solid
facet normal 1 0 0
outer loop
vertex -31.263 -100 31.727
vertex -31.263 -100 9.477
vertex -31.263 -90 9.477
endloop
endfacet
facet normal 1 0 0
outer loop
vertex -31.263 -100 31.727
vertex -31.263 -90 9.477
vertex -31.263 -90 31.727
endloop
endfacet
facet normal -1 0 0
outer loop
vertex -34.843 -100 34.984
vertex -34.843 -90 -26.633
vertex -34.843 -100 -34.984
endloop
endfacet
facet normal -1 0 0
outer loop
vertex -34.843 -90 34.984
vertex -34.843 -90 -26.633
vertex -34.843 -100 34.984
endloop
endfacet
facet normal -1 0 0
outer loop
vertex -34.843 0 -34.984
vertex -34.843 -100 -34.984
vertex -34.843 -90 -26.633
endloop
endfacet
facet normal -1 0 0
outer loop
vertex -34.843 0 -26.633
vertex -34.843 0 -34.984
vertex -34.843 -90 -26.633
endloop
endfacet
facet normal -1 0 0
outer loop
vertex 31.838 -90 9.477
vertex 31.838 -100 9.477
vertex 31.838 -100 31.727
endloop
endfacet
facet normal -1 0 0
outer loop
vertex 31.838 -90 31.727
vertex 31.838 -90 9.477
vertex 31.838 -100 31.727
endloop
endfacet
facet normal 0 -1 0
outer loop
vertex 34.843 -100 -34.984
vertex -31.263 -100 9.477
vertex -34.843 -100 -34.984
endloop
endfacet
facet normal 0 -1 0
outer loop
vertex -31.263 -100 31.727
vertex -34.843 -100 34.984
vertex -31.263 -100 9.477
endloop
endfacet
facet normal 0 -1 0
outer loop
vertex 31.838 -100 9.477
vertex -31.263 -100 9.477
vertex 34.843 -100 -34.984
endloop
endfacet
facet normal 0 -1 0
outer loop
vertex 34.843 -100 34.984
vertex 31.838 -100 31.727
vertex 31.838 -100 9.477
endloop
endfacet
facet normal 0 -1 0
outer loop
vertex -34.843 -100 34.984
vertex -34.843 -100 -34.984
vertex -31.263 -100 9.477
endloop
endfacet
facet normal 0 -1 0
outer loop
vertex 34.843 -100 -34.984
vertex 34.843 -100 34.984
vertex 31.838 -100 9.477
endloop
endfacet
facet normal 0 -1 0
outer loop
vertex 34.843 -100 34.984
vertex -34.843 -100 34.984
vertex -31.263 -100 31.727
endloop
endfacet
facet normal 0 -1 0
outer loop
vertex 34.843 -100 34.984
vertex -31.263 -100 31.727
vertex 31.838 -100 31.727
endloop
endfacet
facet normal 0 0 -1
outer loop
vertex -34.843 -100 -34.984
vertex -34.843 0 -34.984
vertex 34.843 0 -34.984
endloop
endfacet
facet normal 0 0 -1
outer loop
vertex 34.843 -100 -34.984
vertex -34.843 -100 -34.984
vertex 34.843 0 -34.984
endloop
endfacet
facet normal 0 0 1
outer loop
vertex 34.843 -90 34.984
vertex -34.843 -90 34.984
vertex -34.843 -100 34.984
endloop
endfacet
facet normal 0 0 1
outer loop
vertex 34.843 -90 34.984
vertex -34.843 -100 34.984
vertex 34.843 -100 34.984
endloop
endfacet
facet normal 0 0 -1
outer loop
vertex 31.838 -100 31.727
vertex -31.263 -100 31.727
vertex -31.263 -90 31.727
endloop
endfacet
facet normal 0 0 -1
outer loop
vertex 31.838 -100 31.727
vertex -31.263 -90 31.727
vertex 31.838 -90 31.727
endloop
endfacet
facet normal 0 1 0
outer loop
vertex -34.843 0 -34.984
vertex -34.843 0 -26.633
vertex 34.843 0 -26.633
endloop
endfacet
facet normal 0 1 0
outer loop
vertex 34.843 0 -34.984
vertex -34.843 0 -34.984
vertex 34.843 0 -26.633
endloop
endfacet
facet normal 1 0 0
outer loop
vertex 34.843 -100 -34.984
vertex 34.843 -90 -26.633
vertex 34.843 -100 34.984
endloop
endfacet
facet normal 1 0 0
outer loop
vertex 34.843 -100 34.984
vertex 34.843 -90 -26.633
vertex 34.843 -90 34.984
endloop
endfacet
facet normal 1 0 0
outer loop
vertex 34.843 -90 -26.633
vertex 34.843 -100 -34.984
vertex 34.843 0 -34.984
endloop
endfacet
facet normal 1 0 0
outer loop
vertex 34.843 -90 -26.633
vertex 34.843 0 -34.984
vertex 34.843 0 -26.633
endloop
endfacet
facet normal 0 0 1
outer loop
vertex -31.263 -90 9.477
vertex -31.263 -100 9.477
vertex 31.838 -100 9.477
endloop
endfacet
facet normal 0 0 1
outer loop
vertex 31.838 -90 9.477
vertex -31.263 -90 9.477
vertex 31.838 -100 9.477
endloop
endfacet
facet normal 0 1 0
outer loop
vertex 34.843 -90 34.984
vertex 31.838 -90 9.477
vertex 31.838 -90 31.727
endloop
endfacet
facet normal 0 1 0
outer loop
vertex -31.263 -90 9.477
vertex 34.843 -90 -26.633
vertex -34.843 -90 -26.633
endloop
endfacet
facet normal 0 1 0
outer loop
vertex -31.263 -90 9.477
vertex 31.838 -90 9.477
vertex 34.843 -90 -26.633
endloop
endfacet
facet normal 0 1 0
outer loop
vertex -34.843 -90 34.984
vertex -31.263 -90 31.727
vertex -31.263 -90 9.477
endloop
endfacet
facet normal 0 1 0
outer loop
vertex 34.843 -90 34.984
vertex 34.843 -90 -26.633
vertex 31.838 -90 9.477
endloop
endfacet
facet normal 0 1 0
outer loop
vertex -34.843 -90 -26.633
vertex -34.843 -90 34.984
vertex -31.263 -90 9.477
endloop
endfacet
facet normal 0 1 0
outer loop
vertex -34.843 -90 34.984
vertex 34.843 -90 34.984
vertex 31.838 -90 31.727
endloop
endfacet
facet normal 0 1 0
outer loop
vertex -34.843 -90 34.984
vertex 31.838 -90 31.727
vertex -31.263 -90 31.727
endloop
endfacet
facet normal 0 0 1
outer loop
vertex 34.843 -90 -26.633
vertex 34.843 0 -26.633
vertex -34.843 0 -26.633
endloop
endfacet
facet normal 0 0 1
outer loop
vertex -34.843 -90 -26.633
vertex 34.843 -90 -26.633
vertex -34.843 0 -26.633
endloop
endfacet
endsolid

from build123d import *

# Parameters (mm, degrees)
F0_W     = 69.685258
F0_H     = 69.96853
F1_DEPTH = 100
F2_W     = 69.685258
F2_H     = 61.617006
F3_DEPTH = 90
F4_W     = 63.10162
F4_H     = 22.249703
F5_DEPTH = 25


with BuildPart() as f1:
    # F0 (on Front) → F1 (new body)
    with BuildSketch(Plane.XZ):
        Rectangle(F0_W, F0_H)
    extrude(amount=F1_DEPTH)

    # F2 (on face) → F3 (cut)
    with BuildSketch(Plane(origin=(0, 0, 0), x_dir=(-1, 0, 0), z_dir=(0, 1, 0))):
        with Locations((0, 4.175762)):
            Rectangle(F2_W, F2_H)
    extrude(amount=-F3_DEPTH, mode=Mode.SUBTRACT)

    # F4 (on face) → F5 (cut)
    with BuildSketch(Plane.XZ.offset(100)):
        with Locations((0.287328, 20.602283)):
            Rectangle(F4_W, F4_H)
    extrude(amount=-F5_DEPTH, mode=Mode.SUBTRACT)


solid = f1.part
